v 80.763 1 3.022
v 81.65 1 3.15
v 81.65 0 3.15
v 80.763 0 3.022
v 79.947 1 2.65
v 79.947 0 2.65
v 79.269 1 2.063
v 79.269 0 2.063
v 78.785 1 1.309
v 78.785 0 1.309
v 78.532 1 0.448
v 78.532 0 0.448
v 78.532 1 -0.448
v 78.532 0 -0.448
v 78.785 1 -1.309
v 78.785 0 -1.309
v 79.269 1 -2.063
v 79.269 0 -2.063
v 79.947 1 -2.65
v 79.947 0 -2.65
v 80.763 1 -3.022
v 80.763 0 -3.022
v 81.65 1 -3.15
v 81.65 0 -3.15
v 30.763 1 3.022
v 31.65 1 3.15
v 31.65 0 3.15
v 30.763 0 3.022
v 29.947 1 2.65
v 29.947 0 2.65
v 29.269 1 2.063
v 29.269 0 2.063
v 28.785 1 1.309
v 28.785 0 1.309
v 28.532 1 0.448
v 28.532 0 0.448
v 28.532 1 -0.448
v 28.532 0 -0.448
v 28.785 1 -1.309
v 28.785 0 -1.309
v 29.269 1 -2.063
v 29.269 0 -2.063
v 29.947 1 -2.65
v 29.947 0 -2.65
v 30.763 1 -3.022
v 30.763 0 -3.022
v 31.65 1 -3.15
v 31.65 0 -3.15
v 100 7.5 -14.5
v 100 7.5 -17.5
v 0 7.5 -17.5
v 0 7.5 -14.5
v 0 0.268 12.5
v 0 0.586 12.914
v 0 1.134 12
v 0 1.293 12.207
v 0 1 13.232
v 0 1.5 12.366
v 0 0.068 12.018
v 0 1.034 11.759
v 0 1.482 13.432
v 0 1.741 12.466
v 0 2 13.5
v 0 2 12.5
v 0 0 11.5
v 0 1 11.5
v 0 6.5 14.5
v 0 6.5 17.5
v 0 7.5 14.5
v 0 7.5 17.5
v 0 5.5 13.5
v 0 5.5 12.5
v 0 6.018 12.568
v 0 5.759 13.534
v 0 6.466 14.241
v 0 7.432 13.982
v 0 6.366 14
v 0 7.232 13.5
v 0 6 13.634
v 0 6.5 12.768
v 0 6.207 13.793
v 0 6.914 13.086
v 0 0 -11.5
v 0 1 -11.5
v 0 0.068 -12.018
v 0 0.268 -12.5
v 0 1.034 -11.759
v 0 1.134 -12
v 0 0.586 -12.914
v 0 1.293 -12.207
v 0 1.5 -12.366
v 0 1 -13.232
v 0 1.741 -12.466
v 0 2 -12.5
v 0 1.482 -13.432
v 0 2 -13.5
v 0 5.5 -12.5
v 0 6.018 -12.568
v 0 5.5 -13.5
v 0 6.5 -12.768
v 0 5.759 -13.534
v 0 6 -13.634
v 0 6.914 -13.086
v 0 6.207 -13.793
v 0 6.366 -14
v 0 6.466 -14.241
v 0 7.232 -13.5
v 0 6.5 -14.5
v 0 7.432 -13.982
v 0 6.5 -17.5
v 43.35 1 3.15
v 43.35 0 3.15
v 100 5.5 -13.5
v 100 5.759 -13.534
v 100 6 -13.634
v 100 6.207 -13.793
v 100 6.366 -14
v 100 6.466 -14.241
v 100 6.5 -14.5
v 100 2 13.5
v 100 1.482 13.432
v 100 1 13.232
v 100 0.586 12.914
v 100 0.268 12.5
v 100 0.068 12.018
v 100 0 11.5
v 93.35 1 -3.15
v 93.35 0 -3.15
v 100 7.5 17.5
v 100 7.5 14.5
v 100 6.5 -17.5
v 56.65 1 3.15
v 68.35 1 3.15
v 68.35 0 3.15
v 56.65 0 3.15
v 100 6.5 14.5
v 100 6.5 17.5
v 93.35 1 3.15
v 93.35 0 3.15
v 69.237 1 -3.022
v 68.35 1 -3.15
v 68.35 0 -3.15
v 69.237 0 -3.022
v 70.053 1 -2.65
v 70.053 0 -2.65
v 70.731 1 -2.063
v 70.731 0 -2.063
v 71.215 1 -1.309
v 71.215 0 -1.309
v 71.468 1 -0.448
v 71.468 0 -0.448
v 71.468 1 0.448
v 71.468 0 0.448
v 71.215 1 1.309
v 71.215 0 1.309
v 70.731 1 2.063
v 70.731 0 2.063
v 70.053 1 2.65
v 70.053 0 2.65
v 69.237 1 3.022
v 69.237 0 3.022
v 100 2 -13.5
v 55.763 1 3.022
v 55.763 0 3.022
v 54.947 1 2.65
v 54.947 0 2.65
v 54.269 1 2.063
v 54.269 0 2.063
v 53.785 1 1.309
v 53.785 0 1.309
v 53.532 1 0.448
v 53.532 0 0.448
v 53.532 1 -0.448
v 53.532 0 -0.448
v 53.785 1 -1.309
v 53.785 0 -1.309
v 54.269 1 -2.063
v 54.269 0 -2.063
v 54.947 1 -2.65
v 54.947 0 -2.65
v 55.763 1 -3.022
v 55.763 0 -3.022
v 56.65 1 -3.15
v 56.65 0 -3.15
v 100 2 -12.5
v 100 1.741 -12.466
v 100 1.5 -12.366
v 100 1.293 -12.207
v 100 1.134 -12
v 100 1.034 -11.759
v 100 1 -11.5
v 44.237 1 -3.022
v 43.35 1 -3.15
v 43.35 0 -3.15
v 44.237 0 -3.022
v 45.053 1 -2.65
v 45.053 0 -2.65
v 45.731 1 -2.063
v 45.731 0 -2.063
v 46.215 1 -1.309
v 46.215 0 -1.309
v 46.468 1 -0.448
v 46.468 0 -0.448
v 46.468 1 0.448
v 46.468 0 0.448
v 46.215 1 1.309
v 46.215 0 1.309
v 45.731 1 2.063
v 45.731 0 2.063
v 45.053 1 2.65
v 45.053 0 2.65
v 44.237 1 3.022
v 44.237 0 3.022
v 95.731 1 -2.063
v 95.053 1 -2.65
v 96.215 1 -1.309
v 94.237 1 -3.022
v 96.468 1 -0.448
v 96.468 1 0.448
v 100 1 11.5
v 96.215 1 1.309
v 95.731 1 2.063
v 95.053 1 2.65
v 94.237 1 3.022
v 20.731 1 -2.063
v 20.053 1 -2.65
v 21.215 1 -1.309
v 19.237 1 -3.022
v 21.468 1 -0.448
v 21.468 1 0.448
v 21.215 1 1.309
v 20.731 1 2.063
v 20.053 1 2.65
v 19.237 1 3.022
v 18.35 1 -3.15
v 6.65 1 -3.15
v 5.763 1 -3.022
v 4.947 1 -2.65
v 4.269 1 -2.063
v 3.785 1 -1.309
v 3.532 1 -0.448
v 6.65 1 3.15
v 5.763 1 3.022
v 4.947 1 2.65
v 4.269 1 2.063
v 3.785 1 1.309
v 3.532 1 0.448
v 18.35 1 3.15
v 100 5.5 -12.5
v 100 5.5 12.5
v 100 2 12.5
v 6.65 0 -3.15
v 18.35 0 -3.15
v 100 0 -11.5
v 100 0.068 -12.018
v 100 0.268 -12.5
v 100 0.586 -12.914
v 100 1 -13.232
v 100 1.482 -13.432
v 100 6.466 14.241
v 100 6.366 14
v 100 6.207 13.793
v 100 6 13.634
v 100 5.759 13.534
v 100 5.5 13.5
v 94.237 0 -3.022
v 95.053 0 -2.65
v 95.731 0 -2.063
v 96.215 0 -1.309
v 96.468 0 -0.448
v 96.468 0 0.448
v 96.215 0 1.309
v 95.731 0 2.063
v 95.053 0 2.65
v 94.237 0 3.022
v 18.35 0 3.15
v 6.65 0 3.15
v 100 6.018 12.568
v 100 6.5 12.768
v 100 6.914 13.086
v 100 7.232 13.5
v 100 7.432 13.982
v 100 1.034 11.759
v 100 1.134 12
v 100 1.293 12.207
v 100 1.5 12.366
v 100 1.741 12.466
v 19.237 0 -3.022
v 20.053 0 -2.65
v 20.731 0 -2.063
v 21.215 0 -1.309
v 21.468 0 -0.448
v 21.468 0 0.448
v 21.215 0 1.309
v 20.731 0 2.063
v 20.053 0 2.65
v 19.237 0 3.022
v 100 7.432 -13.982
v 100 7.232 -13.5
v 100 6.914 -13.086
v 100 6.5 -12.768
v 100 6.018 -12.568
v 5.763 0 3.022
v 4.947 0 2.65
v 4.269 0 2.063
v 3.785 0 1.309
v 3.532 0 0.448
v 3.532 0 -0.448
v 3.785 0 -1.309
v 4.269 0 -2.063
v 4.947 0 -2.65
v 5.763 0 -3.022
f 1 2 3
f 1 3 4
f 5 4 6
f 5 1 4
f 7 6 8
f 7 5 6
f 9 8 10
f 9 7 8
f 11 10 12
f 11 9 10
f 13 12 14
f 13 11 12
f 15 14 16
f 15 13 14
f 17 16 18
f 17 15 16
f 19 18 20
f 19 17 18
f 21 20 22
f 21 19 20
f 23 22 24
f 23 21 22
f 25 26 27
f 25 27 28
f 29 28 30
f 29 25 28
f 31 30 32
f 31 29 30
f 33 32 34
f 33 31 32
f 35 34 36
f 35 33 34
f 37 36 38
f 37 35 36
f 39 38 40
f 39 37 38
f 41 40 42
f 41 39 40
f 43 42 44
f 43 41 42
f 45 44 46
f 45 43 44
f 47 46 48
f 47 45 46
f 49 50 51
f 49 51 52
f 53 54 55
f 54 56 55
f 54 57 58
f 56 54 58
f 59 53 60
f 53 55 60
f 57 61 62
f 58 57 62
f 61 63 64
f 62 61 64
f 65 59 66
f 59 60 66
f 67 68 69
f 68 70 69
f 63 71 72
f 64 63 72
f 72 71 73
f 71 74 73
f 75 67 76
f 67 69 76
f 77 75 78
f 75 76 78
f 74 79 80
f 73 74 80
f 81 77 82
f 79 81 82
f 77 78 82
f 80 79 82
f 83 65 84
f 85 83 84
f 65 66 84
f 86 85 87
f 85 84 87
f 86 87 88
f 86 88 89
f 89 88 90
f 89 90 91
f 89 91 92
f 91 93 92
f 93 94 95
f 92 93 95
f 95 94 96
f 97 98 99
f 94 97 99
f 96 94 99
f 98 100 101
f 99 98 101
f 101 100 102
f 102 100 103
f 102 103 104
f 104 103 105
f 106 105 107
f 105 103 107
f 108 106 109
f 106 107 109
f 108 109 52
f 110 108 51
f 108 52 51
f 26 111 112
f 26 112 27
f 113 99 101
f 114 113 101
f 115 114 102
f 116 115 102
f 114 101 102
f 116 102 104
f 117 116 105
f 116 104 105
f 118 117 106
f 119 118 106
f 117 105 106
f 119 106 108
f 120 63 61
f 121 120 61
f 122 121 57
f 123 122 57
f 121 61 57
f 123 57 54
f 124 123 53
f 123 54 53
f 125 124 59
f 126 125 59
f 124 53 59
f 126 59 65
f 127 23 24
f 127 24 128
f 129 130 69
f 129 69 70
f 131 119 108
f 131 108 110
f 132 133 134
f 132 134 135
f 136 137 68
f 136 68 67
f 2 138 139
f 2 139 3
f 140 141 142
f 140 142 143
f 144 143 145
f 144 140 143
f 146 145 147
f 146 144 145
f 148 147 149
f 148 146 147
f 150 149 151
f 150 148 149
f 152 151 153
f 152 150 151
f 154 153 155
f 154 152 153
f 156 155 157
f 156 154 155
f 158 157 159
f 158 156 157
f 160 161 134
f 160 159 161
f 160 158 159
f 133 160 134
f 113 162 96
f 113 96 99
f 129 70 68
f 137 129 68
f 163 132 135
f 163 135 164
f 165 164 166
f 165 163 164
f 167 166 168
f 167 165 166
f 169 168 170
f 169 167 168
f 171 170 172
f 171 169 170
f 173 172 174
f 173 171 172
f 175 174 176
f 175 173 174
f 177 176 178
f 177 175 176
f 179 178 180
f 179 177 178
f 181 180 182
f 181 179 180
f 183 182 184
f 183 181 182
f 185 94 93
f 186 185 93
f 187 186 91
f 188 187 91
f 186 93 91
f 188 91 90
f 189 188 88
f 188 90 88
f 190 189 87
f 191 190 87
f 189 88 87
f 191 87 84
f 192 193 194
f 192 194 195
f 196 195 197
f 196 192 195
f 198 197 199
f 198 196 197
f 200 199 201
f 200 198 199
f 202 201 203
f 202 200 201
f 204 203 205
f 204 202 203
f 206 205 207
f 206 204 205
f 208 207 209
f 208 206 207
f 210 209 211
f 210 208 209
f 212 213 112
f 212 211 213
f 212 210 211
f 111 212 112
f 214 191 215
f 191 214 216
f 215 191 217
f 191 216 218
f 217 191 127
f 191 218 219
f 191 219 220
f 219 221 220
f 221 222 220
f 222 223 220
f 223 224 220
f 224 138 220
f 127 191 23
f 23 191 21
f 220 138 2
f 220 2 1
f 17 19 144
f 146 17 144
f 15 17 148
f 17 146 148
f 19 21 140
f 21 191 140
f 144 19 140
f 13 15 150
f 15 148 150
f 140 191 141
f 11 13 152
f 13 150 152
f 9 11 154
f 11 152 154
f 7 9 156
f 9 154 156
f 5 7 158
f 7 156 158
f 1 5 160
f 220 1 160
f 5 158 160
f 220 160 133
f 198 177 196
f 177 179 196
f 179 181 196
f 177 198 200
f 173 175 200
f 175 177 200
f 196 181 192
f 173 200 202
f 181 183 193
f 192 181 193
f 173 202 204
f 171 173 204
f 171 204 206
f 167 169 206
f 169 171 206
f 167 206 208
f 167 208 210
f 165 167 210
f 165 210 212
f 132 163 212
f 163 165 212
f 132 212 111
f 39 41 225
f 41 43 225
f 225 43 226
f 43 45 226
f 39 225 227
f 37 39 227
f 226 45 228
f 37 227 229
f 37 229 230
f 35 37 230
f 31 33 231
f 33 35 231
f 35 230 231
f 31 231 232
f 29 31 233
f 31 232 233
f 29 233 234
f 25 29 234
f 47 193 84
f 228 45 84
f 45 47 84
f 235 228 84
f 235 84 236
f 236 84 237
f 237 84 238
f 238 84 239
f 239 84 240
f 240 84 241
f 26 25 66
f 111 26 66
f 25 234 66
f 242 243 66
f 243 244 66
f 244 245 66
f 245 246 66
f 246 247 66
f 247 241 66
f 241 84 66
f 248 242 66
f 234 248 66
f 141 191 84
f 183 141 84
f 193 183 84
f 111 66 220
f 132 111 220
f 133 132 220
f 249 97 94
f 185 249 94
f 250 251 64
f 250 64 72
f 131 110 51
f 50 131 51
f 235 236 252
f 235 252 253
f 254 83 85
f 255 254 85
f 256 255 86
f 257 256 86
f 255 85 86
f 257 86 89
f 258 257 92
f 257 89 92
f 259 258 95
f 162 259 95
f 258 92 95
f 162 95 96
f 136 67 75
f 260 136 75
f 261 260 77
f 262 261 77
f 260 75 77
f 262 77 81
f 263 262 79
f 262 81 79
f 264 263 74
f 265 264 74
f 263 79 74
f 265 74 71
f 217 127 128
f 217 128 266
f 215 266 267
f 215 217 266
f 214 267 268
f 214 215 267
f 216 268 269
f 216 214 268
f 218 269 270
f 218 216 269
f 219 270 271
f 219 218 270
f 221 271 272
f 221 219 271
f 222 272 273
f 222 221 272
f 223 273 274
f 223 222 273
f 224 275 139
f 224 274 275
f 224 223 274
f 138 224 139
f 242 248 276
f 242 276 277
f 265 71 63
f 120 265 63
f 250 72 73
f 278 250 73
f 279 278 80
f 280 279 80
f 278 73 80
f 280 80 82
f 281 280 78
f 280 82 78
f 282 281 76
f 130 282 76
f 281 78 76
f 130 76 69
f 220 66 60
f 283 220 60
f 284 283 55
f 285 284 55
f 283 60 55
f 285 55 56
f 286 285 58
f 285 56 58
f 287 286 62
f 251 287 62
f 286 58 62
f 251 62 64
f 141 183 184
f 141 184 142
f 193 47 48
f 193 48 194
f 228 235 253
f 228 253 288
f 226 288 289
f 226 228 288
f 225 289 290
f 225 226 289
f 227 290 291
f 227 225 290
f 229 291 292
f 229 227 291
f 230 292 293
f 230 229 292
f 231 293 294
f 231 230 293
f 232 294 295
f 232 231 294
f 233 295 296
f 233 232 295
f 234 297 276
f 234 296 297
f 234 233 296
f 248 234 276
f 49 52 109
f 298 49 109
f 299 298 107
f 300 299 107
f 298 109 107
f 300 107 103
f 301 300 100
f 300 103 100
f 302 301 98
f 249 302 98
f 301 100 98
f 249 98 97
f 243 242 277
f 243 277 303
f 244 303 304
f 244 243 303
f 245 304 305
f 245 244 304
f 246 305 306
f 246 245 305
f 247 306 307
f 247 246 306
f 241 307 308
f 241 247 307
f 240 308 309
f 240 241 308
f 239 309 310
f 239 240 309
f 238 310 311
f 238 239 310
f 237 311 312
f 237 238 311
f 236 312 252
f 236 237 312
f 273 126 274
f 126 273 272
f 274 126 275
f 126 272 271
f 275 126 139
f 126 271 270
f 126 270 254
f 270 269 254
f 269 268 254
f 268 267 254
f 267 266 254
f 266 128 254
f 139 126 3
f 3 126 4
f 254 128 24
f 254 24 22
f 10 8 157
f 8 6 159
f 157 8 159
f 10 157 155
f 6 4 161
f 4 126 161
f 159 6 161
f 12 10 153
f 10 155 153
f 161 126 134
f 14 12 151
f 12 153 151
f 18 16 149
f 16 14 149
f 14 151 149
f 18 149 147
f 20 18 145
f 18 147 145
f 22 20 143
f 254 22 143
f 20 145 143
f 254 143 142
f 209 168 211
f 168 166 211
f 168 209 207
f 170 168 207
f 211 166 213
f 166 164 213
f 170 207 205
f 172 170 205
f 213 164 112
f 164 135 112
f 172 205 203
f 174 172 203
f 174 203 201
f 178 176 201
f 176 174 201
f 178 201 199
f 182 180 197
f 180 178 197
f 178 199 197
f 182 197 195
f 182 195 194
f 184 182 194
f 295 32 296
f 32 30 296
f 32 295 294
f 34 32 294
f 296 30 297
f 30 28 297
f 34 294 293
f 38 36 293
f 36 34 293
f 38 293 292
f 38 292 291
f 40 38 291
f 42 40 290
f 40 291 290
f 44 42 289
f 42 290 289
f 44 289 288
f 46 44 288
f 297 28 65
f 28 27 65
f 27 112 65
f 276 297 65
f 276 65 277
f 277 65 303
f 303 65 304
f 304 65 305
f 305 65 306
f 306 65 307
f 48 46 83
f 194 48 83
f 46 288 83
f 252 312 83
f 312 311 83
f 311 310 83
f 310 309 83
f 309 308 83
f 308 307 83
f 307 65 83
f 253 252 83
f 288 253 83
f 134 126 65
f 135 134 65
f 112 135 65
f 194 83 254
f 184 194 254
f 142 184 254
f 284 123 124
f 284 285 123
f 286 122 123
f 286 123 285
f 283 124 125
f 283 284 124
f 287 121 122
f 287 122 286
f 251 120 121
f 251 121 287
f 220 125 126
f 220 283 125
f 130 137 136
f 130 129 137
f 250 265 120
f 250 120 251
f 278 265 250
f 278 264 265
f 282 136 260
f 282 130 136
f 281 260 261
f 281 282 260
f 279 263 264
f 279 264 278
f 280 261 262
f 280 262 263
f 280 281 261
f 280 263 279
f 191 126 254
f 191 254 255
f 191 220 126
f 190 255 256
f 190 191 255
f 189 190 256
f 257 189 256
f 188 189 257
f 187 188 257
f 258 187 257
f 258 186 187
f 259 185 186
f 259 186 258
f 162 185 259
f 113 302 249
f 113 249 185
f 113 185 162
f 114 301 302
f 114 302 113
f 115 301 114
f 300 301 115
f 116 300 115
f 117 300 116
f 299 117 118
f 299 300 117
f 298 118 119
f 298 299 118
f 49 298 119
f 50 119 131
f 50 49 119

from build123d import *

# Parameters (mm, degrees)
SM_BASE_FLANGE_1_DEPTH = 100
CUT_EXTRUDE_1_DEPTH    = 102.727577382
PATTERN_LINEAR_6_COUNT = 4
PATTERN_LINEAR_6_PITCH = 25


# Sheet-metal steps are written as plain solids
with BuildPart() as part:
    # Sketch 1 → Базовая кромка1 (new body)
    with BuildSketch(Plane(origin=(0, 0, 0), x_dir=(0, 0, -1), z_dir=(1, 0, 0))):
        with BuildLine():
            Line((-17.5, 6.5), (-14.5, 6.5))
            ThreePointArc((-14.5, 6.5), (-13.792893219, 6.207106781), (-13.5, 5.5))
            Line((-13.5, 5.5), (-13.5, 2))
            ThreePointArc((-13.5, 2), (-12.914213562, 0.585786438), (-11.5, 0))
            Line((-11.5, 0), (11.5, 0))
            ThreePointArc((11.5, 0), (12.914213562, 0.585786438), (13.5, 2))
            Line((13.5, 2), (13.5, 5.5))
            ThreePointArc((13.5, 5.5), (13.792893219, 6.207106781), (14.5, 6.5))
            Line((14.5, 6.5), (17.5, 6.5))
            Line((17.5, 6.5), (17.5, 7.5))
            Line((17.5, 7.5), (14.5, 7.5))
            ThreePointArc((14.5, 7.5), (13.085786438, 6.914213562), (12.5, 5.5))
            Line((12.5, 5.5), (12.5, 2))
            ThreePointArc((12.5, 2), (12.207106781, 1.292893219), (11.5, 1))
            Line((11.5, 1), (-11.5, 1))
            ThreePointArc((-11.5, 1), (-12.207106781, 1.292893219), (-12.5, 2))
            Line((-12.5, 2), (-12.5, 5.5))
            ThreePointArc((-12.5, 5.5), (-13.085786438, 6.914213562), (-14.5, 7.5))
            Line((-14.5, 7.5), (-17.5, 7.5))
            Line((-17.5, 7.5), (-17.5, 6.5))
        make_face()
    extrude(amount=SM_BASE_FLANGE_1_DEPTH)

    # Эскиз6 → Вырез-Вытянуть1 (cut, through all)
    with BuildSketch(Plane(origin=(0, 1, 0), x_dir=(1, 0, 0), z_dir=(0, 1, 0))):
        with BuildLine():
            Line((6.65, 3.15), (18.35, 3.15))
            ThreePointArc((18.35, 3.15), (21.5, 0), (18.35, -3.15))
            Line((18.35, -3.15), (6.65, -3.15))
            ThreePointArc((6.65, -3.15), (3.5, 0), (6.65, 3.15))
        make_face()
    cut_extrude_1 = extrude(amount=-CUT_EXTRUDE_1_DEPTH, mode=Mode.SUBTRACT)

    # Линейный массив6: Вырез-Вытянуть1 ×4
    with Locations(*[(i * PATTERN_LINEAR_6_PITCH, 0, 0) for i in range(1, PATTERN_LINEAR_6_COUNT)]):
        add(cut_extrude_1, mode=Mode.SUBTRACT)


solid = part.part
